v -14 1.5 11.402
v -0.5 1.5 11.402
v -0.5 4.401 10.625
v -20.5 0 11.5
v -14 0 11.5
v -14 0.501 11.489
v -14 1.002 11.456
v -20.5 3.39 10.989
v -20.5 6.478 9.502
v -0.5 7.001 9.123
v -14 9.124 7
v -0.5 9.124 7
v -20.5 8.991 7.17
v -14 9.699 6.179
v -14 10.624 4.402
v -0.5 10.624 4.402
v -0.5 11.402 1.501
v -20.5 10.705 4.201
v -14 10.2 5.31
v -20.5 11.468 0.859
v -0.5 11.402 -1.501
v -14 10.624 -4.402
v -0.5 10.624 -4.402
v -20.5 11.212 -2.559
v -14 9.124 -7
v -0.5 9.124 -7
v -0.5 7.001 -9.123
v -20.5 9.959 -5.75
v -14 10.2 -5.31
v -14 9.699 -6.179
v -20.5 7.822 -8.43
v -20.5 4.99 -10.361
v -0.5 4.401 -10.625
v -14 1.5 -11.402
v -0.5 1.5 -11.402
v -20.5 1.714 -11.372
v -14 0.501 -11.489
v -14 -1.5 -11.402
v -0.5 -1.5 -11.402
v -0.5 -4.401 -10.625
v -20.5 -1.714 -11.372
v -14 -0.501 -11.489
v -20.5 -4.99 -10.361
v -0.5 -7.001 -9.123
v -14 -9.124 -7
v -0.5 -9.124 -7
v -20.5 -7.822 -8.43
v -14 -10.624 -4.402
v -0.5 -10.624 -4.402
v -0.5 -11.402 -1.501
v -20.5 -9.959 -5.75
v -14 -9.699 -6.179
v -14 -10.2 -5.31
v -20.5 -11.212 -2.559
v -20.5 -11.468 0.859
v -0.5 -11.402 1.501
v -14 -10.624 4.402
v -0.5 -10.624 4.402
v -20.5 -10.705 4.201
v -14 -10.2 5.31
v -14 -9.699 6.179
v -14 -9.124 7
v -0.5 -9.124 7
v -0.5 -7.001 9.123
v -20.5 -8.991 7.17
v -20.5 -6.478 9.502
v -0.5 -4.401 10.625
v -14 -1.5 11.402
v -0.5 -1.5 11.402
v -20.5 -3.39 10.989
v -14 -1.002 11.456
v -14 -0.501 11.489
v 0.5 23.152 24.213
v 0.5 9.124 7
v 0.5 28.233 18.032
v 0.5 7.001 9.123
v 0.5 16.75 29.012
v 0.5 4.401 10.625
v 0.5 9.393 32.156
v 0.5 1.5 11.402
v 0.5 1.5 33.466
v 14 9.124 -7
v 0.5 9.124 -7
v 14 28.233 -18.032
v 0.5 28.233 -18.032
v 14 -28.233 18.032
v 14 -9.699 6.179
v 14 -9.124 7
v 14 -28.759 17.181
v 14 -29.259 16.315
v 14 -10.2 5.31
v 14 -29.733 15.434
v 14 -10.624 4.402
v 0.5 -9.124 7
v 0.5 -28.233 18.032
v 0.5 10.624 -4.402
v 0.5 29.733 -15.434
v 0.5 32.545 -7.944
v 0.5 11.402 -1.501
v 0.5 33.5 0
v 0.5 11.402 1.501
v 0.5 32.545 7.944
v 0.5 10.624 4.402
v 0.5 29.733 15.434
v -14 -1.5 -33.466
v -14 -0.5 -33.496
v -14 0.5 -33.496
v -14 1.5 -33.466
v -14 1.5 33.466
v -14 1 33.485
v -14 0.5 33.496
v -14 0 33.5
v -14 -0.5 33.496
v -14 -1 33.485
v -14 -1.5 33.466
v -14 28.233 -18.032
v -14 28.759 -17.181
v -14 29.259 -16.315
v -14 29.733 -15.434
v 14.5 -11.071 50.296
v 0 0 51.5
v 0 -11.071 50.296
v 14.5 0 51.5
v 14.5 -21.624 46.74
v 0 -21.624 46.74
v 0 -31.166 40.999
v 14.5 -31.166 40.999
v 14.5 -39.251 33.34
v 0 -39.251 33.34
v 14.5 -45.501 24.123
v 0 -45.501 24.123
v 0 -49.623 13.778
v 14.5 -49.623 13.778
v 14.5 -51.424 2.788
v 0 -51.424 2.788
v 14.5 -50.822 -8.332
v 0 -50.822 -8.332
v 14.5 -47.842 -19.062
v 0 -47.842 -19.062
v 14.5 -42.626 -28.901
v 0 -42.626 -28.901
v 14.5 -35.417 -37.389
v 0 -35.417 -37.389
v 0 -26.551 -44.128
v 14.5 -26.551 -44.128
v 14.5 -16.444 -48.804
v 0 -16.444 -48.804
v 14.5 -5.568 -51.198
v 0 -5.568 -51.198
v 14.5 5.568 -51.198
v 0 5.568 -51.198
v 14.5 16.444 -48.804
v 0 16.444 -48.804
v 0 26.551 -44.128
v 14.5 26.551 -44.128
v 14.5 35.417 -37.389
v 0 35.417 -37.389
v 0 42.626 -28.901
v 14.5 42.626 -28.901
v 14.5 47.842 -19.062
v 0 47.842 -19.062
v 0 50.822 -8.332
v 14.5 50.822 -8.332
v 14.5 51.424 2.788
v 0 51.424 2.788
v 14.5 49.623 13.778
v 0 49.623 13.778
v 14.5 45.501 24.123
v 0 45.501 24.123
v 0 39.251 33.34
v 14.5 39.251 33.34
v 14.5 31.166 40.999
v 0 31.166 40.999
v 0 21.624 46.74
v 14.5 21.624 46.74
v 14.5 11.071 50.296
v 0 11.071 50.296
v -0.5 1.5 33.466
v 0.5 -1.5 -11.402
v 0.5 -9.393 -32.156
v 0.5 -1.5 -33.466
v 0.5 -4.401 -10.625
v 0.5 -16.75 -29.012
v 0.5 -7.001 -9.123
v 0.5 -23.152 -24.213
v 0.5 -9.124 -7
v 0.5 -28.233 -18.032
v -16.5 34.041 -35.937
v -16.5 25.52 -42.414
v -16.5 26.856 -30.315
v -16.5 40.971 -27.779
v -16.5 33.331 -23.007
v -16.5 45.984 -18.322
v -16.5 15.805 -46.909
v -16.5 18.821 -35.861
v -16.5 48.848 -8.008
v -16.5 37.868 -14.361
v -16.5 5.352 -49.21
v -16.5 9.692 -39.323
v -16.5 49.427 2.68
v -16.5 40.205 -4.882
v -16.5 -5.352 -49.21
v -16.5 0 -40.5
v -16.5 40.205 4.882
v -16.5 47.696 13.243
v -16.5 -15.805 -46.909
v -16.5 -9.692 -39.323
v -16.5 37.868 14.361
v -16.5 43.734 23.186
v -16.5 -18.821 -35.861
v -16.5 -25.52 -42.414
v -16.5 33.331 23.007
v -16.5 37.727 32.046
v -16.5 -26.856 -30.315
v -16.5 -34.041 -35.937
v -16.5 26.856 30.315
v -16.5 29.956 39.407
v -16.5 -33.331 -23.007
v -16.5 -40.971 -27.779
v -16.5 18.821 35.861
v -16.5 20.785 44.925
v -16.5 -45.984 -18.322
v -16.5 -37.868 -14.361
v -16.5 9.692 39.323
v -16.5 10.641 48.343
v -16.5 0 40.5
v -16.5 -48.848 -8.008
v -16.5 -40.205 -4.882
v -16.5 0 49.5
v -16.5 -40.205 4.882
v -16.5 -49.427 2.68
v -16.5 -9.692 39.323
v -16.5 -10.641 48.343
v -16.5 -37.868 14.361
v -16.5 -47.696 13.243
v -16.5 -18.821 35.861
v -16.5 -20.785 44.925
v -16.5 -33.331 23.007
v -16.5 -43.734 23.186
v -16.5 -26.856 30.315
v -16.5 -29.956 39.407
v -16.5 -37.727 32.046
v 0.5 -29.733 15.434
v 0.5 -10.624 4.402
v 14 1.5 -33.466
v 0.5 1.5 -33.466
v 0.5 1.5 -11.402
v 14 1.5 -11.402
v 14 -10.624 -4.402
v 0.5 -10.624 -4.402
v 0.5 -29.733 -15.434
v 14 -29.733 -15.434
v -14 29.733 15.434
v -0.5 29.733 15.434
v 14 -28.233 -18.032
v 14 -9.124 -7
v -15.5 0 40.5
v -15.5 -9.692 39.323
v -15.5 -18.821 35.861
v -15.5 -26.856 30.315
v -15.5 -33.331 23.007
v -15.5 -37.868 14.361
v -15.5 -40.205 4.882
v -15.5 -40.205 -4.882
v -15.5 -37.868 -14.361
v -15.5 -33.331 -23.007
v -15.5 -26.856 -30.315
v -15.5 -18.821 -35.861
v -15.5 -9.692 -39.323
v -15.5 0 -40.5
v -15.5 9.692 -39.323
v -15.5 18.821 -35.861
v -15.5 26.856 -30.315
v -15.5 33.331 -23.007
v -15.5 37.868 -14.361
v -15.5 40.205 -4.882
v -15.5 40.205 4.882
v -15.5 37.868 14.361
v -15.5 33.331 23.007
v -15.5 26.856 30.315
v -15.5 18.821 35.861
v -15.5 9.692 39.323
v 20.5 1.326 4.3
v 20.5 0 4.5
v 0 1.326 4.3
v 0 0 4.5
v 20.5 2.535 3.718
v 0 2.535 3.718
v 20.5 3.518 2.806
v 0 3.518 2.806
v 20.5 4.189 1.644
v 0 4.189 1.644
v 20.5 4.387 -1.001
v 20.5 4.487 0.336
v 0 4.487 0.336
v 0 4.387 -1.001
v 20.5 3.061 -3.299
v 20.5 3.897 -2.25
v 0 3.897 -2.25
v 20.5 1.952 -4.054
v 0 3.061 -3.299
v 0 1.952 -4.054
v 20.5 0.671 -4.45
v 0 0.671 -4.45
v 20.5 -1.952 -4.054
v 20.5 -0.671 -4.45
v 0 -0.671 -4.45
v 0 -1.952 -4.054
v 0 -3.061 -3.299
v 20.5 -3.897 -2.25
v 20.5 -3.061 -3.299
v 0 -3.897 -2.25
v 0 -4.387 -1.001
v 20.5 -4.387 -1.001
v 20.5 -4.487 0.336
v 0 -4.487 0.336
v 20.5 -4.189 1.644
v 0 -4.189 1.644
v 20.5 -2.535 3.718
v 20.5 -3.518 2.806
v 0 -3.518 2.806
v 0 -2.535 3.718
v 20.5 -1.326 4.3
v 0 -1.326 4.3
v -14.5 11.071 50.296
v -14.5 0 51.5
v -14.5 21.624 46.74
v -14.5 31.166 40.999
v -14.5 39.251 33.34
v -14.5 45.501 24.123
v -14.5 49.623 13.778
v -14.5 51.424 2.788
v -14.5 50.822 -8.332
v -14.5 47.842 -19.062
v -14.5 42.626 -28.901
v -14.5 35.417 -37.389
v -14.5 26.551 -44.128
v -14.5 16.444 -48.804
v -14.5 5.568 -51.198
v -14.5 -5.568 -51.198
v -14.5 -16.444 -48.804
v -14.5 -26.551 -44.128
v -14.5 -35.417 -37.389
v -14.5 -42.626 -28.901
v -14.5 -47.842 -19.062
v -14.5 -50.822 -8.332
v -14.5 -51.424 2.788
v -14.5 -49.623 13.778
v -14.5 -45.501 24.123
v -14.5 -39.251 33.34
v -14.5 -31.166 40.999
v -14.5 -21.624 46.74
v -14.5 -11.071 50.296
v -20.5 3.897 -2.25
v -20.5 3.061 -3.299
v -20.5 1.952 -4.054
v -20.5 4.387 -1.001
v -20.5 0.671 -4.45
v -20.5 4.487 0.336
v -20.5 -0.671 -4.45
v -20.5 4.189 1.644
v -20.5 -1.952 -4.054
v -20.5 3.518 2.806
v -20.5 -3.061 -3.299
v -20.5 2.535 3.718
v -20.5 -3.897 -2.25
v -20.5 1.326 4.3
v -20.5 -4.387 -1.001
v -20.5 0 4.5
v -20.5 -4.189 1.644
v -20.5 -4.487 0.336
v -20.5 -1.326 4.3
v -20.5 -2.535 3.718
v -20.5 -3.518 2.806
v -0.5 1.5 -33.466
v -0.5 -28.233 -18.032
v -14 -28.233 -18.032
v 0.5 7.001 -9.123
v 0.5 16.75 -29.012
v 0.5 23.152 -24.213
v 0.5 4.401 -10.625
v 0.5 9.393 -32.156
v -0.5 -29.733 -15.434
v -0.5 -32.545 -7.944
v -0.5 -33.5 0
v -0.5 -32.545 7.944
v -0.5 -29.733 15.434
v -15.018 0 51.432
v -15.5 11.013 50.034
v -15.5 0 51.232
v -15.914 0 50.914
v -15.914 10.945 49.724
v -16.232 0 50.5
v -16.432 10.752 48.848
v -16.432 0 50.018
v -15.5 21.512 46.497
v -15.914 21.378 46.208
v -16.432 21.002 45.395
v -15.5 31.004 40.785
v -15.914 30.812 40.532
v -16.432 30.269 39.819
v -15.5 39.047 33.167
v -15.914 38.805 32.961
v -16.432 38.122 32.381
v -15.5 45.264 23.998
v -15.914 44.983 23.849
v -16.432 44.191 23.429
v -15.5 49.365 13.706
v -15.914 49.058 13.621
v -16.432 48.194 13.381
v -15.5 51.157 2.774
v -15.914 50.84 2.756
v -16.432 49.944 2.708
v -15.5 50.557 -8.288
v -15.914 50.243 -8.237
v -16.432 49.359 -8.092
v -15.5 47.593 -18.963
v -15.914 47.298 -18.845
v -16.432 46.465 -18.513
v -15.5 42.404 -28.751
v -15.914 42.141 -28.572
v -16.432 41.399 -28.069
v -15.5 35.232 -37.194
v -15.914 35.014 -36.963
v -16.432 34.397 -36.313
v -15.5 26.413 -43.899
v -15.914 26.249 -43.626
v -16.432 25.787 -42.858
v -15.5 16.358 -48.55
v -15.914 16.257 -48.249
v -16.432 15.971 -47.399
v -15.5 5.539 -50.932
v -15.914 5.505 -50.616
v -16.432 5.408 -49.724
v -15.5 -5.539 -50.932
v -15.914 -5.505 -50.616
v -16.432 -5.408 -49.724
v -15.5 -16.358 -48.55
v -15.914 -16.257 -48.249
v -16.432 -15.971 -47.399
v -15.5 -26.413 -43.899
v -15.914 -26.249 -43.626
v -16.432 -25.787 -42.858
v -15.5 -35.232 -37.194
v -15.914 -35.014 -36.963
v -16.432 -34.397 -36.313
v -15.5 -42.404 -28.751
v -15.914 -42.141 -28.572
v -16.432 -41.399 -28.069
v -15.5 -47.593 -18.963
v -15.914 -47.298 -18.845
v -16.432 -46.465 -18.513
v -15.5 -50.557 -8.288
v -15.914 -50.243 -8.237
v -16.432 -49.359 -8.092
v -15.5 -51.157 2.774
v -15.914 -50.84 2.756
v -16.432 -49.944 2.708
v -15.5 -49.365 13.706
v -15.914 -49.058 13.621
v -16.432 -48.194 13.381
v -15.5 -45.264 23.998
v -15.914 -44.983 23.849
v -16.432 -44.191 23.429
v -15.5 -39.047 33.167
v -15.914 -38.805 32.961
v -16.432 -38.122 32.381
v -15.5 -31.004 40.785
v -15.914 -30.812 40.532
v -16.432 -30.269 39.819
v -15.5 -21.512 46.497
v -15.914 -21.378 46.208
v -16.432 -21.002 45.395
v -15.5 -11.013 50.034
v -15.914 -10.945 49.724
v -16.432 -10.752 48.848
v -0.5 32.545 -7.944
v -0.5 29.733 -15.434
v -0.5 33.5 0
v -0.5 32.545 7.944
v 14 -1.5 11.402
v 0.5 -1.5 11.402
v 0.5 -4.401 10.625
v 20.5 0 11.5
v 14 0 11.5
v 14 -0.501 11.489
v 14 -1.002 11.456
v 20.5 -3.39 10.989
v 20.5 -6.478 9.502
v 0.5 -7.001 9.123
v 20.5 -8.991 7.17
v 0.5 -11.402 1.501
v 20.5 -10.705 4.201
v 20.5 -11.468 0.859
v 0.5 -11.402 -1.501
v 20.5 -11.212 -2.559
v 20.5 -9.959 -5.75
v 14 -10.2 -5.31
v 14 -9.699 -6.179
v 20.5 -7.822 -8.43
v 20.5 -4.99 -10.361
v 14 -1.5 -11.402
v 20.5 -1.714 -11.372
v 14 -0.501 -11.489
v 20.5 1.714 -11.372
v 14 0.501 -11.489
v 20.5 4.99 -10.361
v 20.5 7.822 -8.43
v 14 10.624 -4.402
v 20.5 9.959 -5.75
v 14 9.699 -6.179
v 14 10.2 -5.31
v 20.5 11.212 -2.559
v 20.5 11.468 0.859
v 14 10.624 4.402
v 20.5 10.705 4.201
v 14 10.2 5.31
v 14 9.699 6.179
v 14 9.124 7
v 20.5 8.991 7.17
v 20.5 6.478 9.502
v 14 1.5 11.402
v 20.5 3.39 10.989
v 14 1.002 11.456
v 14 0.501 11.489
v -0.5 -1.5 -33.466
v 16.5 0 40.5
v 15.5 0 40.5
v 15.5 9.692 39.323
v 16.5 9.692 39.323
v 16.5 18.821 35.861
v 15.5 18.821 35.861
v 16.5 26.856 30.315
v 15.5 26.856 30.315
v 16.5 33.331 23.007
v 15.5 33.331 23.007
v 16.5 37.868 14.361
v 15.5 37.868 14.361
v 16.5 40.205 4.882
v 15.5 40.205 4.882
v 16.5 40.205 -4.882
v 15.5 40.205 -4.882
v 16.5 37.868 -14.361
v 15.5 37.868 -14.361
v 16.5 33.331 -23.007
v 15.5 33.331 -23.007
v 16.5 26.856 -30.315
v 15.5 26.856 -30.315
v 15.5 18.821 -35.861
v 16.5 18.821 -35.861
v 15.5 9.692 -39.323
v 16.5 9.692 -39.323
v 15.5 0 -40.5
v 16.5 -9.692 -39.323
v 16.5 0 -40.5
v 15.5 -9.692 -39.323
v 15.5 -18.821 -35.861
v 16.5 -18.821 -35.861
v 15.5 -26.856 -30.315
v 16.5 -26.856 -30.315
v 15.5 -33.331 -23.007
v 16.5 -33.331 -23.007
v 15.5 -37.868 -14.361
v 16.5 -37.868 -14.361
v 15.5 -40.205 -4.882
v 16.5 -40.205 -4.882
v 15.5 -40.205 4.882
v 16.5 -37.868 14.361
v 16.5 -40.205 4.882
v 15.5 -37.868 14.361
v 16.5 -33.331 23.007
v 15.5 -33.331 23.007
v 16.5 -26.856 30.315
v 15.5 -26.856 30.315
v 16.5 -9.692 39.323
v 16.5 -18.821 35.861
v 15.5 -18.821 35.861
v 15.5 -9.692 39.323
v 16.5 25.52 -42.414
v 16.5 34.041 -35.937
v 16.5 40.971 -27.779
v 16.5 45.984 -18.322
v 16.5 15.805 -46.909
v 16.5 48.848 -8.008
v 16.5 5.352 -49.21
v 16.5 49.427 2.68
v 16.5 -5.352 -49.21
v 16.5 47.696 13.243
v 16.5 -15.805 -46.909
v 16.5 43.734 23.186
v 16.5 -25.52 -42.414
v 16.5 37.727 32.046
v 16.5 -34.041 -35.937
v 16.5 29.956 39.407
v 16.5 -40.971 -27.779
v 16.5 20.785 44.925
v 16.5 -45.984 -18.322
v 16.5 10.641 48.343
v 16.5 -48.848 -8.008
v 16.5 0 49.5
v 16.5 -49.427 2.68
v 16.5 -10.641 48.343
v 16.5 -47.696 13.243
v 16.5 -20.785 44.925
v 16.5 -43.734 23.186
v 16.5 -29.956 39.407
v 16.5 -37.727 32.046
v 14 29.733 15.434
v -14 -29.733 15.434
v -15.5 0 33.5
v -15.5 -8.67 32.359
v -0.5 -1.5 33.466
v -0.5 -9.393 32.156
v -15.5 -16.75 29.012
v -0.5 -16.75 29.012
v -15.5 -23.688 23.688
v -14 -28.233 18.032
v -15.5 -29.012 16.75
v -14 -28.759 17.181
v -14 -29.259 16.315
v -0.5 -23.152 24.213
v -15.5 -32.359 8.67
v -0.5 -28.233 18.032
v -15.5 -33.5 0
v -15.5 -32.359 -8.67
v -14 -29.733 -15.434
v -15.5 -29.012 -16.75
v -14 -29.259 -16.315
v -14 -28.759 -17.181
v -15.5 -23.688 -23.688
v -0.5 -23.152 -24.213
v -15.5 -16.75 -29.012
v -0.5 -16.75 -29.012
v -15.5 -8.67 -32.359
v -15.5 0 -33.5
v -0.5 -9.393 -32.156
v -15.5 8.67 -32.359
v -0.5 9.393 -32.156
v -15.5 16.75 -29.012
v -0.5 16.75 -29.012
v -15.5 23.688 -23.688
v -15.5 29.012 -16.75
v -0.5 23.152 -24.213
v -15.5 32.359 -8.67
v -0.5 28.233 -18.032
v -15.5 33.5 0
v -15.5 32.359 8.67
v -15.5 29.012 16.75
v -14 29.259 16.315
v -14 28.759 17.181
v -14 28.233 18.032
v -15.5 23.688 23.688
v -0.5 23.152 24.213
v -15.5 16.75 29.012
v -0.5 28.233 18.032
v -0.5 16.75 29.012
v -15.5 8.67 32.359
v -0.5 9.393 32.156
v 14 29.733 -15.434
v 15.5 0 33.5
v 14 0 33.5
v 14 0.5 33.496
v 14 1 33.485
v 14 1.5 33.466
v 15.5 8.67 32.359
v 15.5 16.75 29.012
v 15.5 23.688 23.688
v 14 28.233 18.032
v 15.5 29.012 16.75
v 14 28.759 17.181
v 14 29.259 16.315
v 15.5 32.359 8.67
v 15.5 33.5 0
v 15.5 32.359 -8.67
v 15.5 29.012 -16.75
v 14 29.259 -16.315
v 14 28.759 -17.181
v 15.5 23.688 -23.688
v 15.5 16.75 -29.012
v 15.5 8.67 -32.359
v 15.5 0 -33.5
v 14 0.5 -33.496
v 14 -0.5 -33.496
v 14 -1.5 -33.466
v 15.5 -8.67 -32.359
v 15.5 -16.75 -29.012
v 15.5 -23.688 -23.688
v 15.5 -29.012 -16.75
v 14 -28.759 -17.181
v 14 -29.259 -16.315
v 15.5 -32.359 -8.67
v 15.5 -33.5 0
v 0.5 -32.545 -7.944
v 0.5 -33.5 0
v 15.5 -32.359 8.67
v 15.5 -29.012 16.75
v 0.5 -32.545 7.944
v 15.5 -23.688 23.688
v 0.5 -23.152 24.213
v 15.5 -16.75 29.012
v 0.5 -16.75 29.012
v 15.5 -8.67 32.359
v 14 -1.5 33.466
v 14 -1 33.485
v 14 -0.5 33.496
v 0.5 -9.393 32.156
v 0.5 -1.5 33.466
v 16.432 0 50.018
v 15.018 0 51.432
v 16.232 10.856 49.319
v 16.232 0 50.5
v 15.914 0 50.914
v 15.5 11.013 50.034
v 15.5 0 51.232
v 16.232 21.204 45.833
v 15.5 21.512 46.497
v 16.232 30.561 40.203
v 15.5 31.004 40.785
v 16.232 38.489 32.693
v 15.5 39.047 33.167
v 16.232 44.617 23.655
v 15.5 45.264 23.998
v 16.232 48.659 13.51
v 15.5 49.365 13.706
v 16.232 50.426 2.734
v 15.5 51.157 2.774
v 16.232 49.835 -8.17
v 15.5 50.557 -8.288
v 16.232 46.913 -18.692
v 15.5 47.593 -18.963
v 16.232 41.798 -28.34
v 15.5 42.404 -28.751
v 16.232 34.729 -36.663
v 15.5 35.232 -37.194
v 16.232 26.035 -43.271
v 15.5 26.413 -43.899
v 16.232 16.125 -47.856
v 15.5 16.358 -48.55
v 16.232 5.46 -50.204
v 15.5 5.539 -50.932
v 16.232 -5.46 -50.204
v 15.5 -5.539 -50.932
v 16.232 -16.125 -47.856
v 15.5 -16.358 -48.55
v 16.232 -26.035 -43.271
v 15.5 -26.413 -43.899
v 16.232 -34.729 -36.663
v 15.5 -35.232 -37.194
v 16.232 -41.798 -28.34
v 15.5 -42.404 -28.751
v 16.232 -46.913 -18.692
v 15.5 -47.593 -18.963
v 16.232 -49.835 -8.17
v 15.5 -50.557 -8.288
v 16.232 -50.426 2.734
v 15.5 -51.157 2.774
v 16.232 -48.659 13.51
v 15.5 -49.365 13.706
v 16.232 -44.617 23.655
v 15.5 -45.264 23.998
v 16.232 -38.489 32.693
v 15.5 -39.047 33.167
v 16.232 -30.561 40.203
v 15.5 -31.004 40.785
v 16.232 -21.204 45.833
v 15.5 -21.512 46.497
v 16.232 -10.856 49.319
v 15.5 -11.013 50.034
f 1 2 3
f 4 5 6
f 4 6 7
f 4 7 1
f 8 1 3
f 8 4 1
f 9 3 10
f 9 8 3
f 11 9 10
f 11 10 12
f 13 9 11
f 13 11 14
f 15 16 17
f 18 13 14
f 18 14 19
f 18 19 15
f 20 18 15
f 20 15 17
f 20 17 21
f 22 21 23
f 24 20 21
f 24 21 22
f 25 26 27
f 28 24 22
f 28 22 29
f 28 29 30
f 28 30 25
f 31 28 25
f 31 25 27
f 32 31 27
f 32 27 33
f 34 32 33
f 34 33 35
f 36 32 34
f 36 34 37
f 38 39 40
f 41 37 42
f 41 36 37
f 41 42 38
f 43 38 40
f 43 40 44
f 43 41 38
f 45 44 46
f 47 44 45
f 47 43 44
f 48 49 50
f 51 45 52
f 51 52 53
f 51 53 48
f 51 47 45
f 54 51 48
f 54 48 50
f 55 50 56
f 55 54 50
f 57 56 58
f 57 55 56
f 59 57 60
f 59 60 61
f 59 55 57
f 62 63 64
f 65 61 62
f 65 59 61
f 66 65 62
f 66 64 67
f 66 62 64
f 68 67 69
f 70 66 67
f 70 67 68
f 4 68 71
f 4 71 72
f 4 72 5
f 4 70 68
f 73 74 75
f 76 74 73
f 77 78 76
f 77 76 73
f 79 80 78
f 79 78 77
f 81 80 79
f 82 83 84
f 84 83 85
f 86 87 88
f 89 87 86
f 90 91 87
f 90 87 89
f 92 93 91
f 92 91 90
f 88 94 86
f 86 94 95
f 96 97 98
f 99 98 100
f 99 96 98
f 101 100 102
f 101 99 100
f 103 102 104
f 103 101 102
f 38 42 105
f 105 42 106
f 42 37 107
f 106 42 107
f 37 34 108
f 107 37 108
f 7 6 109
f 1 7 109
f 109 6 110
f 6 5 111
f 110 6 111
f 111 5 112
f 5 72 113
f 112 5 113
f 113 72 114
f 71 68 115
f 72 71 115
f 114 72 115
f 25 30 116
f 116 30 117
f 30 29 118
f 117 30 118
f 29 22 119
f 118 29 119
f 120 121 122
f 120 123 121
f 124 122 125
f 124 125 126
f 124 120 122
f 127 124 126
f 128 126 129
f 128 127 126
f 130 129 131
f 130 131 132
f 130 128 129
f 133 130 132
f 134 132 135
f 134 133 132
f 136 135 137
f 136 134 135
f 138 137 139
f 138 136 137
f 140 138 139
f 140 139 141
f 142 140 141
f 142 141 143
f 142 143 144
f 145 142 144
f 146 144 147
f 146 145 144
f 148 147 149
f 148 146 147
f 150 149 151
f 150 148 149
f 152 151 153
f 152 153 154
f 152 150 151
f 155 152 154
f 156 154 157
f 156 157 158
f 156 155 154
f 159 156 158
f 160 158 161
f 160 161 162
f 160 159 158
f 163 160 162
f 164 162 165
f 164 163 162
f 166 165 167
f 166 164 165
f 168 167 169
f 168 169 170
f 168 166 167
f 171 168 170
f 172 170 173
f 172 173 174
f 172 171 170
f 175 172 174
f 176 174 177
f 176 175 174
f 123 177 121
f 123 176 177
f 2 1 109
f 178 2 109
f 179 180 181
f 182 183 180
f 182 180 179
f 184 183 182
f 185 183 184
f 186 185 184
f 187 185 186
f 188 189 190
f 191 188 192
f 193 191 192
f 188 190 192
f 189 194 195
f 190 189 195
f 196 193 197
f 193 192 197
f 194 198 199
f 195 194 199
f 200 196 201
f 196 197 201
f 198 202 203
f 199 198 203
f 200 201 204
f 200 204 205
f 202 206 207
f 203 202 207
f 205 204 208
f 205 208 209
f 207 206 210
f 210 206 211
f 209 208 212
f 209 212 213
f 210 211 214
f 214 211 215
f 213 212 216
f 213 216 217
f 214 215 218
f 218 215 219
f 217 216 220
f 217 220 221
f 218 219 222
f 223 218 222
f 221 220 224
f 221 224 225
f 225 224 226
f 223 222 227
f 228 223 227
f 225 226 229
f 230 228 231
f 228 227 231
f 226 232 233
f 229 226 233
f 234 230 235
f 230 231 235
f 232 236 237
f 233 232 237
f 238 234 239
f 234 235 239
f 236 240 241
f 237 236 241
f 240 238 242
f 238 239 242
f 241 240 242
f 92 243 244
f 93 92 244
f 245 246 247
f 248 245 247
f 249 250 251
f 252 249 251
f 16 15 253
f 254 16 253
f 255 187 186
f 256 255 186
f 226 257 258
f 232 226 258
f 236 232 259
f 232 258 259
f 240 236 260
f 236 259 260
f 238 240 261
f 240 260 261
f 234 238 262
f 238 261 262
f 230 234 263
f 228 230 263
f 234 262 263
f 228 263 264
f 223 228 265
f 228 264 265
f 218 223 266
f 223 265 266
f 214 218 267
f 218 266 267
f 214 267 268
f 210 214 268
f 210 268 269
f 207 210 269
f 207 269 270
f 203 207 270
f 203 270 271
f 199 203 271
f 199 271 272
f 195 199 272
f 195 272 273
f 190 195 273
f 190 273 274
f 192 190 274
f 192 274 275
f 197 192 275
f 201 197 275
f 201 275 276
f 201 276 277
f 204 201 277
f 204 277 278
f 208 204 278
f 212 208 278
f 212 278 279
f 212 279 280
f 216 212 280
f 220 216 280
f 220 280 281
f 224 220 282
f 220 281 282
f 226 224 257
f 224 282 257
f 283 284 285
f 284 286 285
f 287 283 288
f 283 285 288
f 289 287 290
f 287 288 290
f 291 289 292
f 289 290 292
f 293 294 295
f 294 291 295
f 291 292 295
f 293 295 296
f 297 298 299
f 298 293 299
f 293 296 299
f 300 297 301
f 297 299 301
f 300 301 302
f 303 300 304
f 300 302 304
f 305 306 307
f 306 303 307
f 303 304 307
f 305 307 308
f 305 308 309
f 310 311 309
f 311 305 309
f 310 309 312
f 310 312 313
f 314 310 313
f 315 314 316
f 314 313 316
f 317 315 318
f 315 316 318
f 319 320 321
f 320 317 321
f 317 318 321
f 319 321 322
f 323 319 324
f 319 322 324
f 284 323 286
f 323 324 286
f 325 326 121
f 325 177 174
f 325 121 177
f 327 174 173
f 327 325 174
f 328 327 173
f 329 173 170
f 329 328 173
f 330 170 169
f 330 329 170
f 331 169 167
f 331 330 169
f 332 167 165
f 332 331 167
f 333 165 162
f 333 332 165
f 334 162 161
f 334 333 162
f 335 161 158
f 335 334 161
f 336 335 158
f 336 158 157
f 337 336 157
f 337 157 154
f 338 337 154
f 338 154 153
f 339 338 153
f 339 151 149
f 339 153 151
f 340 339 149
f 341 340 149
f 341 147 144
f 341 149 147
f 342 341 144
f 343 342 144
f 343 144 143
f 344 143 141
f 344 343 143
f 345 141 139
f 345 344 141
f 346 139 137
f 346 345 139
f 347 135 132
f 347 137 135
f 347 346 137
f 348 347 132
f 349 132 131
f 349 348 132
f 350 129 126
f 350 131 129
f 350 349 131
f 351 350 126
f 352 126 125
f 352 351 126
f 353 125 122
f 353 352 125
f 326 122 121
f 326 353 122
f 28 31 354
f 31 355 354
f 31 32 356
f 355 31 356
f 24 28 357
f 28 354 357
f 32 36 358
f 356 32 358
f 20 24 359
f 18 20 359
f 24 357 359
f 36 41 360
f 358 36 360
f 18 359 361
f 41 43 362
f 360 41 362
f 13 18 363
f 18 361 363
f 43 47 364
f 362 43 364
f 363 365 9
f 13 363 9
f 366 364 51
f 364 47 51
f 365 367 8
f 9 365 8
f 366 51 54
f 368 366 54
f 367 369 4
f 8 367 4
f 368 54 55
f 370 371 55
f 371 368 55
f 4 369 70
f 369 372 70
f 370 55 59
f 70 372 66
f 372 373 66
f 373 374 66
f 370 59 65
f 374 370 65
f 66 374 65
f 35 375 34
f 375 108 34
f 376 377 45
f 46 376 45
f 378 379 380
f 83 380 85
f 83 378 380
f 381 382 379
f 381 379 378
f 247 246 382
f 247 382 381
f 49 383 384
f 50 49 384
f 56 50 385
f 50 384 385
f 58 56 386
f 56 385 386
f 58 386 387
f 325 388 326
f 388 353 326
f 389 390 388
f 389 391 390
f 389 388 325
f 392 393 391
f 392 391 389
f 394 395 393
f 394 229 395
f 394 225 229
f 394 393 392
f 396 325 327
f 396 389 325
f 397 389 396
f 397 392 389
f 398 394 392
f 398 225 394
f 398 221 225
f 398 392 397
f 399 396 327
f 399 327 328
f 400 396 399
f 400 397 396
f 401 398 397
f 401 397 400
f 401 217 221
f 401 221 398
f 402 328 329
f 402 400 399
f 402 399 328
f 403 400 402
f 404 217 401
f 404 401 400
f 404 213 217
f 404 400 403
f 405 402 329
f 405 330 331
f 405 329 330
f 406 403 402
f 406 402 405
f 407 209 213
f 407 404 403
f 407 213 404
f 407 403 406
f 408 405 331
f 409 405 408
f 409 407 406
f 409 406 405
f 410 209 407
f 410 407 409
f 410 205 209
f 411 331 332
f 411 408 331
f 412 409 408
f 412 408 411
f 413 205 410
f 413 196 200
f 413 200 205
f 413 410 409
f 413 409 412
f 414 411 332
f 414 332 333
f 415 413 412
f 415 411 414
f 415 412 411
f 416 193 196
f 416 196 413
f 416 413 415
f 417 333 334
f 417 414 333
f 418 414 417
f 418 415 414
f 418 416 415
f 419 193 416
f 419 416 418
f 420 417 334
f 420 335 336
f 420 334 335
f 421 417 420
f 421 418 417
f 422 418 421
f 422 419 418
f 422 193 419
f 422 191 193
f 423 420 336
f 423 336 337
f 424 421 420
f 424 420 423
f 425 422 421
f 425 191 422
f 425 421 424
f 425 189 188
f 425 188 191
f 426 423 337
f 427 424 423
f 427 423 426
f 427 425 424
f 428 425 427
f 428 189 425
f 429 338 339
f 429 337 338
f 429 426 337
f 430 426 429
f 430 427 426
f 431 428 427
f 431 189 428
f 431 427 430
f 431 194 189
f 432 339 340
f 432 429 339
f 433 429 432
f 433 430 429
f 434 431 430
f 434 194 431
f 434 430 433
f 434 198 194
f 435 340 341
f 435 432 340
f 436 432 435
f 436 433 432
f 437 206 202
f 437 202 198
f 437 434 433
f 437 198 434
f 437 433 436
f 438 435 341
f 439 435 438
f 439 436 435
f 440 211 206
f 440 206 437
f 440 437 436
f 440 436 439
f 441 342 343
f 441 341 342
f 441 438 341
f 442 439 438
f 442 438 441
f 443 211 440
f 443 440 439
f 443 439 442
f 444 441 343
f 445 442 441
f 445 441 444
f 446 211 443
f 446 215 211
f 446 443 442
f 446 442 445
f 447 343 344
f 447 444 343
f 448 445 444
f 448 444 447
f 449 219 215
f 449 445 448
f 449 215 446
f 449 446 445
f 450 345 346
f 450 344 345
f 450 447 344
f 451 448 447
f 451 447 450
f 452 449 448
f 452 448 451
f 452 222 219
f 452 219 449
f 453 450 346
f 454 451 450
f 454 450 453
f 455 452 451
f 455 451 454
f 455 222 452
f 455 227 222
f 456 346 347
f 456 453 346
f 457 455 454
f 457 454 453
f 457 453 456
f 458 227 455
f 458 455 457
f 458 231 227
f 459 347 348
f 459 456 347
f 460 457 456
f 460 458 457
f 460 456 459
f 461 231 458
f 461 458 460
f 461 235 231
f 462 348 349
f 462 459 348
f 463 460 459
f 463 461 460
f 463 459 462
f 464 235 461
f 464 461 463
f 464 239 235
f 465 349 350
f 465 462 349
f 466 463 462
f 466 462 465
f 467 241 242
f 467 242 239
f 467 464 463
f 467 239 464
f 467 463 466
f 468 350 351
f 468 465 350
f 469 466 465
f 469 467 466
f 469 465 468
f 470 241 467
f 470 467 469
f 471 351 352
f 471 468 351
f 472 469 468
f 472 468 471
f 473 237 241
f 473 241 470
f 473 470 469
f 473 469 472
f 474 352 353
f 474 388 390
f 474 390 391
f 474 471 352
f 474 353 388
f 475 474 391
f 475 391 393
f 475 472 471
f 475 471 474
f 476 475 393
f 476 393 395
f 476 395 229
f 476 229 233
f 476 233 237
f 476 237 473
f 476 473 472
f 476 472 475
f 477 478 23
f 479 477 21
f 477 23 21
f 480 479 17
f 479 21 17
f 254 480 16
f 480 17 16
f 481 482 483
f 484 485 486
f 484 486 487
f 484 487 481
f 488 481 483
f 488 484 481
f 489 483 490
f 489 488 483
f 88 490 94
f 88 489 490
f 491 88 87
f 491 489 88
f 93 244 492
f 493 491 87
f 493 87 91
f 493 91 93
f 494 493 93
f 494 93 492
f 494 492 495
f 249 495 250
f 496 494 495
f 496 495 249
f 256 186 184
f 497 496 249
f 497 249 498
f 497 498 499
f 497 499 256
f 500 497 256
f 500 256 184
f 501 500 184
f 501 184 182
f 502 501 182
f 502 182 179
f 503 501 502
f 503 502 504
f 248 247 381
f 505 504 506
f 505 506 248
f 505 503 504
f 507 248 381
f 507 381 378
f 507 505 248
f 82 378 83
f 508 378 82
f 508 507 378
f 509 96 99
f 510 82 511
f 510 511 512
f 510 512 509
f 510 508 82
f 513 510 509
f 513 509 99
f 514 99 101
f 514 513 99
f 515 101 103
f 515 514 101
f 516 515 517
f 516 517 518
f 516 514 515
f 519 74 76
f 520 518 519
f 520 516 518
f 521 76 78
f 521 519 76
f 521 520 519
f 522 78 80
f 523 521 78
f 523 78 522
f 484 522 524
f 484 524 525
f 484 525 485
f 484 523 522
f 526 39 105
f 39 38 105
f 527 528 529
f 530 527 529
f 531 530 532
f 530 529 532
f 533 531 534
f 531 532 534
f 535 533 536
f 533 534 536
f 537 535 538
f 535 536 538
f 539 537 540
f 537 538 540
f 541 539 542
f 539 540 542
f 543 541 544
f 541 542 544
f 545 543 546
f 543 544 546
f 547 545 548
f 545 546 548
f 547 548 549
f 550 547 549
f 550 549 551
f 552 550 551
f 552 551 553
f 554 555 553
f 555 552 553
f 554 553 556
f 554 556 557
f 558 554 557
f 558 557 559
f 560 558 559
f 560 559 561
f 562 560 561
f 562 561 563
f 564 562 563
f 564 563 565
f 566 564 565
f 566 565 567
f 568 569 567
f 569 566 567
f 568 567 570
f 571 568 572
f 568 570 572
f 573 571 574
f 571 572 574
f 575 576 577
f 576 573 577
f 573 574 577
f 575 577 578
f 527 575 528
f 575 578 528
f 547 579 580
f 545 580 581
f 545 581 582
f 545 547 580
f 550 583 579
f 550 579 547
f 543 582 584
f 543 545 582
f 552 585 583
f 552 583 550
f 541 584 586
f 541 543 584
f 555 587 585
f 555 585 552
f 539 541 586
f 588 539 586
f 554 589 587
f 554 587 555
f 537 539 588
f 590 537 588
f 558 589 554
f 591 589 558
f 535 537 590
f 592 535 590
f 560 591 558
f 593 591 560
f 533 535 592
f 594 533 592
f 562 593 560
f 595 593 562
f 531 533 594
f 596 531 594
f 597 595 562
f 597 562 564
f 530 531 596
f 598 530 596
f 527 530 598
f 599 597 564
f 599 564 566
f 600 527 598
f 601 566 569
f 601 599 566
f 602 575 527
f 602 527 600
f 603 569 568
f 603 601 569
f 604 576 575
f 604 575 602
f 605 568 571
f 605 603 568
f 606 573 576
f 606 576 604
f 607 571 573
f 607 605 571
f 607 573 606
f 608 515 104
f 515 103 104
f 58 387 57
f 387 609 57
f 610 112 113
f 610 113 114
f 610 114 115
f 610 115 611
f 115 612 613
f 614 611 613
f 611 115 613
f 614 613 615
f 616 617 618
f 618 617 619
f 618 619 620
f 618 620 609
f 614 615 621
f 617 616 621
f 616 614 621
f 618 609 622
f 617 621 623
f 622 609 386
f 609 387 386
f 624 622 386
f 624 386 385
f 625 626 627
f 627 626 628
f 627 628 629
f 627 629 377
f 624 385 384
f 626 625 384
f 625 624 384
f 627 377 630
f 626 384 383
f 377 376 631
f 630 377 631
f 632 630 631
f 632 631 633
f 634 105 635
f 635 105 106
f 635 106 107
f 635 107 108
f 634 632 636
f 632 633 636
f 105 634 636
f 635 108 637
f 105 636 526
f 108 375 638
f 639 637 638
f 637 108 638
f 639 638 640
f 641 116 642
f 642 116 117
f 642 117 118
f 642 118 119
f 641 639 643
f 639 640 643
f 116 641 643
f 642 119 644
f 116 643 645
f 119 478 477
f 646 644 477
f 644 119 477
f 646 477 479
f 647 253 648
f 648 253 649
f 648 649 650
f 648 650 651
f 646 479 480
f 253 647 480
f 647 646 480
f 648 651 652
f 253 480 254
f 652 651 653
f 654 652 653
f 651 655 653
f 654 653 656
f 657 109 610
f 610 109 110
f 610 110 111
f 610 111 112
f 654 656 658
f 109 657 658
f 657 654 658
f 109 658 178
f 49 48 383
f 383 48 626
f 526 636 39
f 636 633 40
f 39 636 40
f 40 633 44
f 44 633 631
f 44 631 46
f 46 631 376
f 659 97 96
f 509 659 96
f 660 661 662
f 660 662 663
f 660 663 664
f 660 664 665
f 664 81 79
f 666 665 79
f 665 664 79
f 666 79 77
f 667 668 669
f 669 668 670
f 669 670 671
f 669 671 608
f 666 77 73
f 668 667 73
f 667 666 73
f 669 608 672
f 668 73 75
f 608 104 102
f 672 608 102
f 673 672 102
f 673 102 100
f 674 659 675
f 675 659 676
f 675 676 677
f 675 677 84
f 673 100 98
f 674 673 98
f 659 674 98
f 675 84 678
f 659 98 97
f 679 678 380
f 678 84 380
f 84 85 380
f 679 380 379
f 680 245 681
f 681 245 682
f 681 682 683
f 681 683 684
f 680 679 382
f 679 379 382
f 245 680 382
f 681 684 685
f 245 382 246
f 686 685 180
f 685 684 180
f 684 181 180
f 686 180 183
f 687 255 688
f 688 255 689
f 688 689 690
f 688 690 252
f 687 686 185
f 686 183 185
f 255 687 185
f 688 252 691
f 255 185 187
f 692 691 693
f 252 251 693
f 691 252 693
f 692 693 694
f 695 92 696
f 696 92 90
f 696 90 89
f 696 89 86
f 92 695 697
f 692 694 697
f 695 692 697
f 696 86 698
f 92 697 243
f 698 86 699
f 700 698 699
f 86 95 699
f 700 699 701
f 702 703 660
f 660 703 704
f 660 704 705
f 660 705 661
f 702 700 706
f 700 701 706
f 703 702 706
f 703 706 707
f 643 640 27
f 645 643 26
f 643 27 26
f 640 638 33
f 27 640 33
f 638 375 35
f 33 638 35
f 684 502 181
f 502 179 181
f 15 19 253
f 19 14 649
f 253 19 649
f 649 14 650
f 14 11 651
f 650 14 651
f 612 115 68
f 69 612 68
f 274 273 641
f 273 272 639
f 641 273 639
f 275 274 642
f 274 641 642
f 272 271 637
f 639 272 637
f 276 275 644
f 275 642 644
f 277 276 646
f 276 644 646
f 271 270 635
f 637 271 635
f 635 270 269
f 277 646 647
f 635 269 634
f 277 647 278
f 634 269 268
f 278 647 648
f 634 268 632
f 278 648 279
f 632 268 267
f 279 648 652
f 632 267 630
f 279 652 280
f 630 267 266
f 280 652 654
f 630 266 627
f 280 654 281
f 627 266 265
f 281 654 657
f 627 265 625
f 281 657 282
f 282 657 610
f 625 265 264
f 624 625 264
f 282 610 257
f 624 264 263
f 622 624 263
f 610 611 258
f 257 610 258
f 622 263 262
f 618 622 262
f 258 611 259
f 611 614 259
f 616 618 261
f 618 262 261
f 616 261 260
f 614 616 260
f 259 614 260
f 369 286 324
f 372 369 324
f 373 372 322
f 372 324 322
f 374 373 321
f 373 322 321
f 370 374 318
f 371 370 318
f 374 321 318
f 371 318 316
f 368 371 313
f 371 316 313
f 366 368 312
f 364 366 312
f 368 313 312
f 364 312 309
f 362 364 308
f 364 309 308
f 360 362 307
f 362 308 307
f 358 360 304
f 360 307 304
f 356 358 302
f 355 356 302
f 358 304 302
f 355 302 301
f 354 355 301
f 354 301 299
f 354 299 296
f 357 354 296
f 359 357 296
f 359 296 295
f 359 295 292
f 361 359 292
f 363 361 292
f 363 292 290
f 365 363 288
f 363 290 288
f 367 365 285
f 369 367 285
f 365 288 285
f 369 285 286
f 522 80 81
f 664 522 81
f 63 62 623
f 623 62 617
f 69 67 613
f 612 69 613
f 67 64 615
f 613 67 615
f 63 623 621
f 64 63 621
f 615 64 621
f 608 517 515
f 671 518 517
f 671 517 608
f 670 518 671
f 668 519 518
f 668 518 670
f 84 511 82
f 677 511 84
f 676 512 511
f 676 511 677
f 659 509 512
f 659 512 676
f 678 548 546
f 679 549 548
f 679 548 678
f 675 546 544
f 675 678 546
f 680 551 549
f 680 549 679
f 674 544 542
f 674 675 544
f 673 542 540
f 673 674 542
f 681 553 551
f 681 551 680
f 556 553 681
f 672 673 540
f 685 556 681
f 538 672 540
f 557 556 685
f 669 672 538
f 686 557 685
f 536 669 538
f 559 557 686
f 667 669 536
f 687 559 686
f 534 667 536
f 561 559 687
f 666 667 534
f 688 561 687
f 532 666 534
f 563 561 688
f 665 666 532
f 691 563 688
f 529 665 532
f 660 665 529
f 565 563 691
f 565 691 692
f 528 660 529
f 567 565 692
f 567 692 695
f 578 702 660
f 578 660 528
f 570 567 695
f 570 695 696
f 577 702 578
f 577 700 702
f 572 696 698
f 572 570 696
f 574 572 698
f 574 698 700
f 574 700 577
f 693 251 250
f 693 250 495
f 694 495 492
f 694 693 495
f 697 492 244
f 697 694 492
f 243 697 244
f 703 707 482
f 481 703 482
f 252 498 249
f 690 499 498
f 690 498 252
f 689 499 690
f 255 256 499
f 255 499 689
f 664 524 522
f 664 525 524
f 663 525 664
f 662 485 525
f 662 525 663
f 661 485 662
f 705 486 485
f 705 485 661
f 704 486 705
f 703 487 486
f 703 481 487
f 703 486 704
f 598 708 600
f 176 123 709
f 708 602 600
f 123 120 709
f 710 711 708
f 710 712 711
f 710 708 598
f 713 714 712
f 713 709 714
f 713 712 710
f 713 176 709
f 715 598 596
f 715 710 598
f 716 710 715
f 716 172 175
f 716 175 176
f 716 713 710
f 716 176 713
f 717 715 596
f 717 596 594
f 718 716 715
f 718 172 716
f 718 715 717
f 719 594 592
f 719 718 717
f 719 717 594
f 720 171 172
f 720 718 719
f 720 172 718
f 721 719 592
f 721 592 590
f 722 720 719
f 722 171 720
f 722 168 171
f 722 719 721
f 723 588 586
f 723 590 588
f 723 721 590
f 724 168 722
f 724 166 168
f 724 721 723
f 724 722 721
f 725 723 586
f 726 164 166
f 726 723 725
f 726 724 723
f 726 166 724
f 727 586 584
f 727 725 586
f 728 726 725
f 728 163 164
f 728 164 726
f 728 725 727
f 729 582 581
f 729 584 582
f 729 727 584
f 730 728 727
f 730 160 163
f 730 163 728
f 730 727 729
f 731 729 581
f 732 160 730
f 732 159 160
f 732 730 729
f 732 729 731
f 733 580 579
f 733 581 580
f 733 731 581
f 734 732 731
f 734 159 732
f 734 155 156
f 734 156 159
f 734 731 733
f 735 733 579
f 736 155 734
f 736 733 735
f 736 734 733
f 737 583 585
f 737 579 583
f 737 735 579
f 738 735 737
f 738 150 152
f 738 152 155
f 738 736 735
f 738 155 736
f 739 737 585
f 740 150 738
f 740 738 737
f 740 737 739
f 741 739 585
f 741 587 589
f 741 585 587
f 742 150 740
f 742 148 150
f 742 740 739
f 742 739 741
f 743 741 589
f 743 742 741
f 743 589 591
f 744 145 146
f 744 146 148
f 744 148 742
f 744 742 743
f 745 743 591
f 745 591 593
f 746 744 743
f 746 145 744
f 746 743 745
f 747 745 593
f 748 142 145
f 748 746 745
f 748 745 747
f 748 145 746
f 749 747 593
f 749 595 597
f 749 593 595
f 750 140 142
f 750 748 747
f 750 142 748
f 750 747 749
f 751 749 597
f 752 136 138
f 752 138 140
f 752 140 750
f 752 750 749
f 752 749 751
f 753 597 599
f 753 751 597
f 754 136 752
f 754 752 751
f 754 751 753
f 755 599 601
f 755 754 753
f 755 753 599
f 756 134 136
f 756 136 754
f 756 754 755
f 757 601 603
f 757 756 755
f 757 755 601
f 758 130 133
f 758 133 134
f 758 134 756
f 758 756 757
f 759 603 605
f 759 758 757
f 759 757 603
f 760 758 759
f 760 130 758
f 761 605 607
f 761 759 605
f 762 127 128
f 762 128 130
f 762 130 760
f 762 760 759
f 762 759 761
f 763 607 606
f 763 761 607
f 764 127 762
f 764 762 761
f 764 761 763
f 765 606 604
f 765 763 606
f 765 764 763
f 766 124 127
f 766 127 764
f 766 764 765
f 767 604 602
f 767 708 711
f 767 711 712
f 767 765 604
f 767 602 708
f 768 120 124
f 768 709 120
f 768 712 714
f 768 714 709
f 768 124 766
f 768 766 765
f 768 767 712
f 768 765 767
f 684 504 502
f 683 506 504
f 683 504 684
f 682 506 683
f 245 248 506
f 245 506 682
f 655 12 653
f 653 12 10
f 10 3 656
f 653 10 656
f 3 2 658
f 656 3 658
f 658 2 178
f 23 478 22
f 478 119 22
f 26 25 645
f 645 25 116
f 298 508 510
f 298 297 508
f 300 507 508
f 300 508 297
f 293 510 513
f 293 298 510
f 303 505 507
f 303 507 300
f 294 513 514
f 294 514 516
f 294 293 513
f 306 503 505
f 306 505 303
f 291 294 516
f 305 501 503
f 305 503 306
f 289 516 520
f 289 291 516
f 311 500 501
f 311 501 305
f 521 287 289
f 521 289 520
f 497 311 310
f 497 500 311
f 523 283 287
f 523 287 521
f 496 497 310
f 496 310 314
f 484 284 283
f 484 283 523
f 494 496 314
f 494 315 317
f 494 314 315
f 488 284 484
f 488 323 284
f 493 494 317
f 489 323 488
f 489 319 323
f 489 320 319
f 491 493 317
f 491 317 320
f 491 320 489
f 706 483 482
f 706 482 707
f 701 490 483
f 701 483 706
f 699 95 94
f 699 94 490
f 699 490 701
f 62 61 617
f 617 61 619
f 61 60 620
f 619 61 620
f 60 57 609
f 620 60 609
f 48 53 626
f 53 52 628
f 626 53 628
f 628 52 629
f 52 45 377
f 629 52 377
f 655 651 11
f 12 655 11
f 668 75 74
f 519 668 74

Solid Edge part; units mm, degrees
sketch "Sketch1" plane through (0, 0, 0) normal (0, -1, 0) x (1, 0, 0)
  line L0 (15.5, 40.5) -> (15.5, 33.5)
  line L1 (15.5, 33.5) -> (0.5, 33.5)
  line L2 (0.5, 33.5) -> (0.5, 11.5)
  line L3 (0.5, 11.5) -> (20.5, 11.5)
  line L4 (20.5, 11.5) -> (20.5, 4.5)
  line L5 (20.5, 4.5) -> (0, 4.5)
  line L6 (-20.5, 4.5) -> (0, 4.5)
  line L7 (-20.5, 11.5) -> (-20.5, 4.5)
  line L8 (-0.5, 11.5) -> (-20.5, 11.5)
  line L9 (-0.5, 33.5) -> (-0.5, 11.5)
  line L10 (-15.5, 33.5) -> (-0.5, 33.5)
  line L11 (-15.5, 40.5) -> (-15.5, 33.5)
  line L12 (-16.5, 40.5) -> (-15.5, 40.5)
  line L13 (-16.5, 51.5) -> (-16.5, 40.5)
  line L14 (0, 51.5) -> (-16.5, 51.5)
  line L15 (0, 51.5) -> (16.5, 51.5)
  line L16 (16.5, 51.5) -> (16.5, 40.5)
  line L17 (16.5, 40.5) -> (15.5, 40.5)
revolve "RevolvedProtrusion1" add sketch "Sketch1" angle 360 about axis through (0, 0, 0) along (1, 0, 0)
sketch "Sketch2" plane through (0, 0, 0) normal (1, 0, 0) x (0, 1, 0)
  line L0 (1.5, 10) -> (1.5, 35)
  line L1 (1.5, 35) -> (-1.5, 35)
  line L2 (-1.5, 35) -> (-1.5, 10)
  line L3 (-1.5, 10) -> (1.5, 10)
extrude "Protrusion1" add sketch "Sketch2" along normal mid plane 28
pattern_circular "Pattern1" count 6 over 360 about axis through (15.5, 0, 0) along (-1, 0, 0) of "Protrusion1"
fillet "arredondado_borracha" radius 2 2 edges at (16.5, 0, -51.5) (-16.5, 0, -51.5)
